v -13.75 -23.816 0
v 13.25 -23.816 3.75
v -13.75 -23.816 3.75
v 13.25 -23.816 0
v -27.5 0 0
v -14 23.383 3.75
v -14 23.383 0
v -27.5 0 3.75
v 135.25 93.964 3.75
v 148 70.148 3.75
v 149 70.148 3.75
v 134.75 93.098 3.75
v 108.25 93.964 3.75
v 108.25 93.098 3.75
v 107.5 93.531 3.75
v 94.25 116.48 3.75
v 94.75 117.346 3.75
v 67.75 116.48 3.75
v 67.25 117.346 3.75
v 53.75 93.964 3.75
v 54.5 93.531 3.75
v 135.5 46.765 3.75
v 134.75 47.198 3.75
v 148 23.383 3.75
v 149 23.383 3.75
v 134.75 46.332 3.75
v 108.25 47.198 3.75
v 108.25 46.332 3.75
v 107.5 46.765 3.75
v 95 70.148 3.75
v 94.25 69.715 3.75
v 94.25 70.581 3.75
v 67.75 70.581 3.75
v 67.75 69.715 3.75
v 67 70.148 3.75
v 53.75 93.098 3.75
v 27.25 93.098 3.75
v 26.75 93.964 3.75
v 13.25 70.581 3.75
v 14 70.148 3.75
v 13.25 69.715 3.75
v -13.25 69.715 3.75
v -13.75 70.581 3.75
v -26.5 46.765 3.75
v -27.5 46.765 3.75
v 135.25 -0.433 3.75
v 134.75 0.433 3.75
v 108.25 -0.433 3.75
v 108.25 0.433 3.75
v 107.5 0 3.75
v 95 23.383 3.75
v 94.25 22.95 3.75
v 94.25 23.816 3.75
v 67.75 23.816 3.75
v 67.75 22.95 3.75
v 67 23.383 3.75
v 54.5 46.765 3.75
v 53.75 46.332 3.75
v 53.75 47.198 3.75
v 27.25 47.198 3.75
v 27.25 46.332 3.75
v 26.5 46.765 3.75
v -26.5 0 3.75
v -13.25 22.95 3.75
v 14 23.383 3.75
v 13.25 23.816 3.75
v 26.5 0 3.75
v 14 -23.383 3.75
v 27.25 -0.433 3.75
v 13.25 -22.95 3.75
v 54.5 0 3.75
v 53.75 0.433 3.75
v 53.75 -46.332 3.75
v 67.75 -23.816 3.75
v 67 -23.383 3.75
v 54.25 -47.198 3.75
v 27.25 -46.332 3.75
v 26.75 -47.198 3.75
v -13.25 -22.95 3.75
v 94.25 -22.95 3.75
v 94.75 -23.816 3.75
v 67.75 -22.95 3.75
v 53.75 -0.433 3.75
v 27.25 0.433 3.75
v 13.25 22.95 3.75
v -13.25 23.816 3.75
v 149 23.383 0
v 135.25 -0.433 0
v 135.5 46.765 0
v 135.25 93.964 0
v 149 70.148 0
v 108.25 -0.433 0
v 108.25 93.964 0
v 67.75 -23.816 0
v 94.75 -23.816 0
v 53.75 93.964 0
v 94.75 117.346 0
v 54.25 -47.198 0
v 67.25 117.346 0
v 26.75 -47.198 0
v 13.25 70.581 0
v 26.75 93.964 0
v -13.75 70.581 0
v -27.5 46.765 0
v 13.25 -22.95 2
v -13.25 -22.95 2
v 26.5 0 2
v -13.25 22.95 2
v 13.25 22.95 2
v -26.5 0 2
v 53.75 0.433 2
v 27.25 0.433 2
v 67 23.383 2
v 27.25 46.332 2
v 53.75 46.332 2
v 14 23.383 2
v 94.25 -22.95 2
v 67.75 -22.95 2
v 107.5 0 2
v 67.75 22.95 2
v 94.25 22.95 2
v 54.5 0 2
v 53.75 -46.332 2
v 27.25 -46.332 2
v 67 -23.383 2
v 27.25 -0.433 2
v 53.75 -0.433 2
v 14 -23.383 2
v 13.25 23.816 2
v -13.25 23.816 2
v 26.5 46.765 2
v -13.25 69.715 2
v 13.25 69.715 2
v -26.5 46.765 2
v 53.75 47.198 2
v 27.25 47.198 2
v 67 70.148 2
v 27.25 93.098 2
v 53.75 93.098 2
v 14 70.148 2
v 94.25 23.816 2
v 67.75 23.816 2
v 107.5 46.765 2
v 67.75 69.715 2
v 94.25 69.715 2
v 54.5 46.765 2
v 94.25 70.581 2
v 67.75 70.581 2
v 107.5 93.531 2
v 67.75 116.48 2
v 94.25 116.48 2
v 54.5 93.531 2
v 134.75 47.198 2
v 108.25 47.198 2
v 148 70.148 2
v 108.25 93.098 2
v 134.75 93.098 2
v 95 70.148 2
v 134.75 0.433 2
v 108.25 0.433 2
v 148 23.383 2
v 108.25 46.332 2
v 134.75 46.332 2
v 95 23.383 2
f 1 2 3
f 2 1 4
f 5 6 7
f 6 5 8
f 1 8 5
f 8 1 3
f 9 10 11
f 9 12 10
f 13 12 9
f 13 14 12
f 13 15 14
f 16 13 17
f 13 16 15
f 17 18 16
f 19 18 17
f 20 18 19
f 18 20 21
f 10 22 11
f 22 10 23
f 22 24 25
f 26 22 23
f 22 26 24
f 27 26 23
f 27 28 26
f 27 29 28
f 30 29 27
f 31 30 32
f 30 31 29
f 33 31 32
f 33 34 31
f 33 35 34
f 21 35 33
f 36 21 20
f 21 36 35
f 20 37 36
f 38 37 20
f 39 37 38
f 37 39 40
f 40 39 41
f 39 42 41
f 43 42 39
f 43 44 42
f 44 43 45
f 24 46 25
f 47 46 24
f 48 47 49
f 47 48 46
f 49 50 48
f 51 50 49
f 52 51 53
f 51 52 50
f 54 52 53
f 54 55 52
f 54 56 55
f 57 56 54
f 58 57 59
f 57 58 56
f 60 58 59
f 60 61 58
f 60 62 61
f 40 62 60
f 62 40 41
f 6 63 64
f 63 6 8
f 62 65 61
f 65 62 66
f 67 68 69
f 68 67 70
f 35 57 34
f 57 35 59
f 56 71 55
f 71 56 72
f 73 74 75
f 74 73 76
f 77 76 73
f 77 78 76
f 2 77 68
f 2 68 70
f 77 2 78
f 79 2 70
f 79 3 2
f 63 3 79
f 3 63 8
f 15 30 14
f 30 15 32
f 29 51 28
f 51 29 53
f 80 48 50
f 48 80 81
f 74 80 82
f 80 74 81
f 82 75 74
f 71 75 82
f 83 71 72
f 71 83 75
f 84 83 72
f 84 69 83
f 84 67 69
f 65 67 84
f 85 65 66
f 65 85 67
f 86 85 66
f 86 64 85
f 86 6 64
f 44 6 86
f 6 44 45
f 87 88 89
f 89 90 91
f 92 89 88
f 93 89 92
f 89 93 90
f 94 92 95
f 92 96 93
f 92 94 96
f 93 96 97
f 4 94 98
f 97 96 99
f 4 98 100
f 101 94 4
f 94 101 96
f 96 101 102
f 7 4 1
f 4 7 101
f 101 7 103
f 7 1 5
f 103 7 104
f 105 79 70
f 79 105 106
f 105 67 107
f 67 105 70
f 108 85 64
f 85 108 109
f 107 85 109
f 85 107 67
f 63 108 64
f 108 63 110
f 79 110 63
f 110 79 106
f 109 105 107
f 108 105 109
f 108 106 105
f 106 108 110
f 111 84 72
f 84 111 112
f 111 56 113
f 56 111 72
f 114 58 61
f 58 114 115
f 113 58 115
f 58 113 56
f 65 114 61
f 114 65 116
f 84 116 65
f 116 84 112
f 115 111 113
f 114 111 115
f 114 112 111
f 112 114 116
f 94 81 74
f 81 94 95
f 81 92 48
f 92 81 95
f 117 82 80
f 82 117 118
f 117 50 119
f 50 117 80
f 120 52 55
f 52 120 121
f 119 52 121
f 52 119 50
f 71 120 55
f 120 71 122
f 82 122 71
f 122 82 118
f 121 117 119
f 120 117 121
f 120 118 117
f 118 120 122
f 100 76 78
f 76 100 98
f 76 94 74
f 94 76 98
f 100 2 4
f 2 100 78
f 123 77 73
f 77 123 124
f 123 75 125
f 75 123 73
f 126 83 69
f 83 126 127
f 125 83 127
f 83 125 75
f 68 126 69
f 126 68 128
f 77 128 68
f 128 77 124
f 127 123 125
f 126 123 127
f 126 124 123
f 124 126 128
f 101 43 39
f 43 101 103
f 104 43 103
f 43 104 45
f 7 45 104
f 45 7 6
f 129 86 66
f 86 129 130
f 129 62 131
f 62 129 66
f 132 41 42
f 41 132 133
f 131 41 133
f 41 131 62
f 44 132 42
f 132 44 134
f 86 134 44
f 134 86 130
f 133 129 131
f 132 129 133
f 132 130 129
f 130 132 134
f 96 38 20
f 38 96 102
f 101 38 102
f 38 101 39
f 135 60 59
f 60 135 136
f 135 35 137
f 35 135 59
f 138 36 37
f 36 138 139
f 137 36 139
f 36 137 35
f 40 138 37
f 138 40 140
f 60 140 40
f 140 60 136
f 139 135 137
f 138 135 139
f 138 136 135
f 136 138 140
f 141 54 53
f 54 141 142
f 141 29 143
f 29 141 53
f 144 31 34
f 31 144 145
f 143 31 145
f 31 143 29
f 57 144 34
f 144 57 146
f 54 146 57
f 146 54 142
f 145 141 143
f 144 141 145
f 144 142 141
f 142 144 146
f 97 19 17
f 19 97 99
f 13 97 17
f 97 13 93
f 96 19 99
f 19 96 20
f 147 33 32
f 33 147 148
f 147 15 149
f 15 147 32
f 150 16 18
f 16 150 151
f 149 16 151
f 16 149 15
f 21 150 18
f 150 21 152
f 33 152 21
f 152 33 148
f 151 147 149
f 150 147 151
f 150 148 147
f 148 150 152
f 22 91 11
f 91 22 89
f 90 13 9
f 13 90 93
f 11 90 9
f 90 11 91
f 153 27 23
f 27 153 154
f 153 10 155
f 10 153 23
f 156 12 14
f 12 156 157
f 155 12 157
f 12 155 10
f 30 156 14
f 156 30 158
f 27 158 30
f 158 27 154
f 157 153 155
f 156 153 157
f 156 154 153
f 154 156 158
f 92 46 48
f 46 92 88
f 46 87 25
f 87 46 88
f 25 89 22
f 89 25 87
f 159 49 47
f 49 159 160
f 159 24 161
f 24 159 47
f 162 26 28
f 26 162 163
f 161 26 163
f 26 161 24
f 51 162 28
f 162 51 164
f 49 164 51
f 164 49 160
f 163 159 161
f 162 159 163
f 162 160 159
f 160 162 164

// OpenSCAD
union() {
	translate(v = [0.0, 0.0, 0]) {
		difference() {
			cylinder($fn = 6, d = 55.0, h = 3.75);
			translate(v = [0, 0, 2.0]) {
				cylinder($fn = 6, d = 53.0, h = 2.75);
			}
		}
	}
	translate(v = [40.5, 23.38268590217984, 0]) {
		difference() {
			cylinder($fn = 6, d = 55.0, h = 3.75);
			translate(v = [0, 0, 2.0]) {
				cylinder($fn = 6, d = 53.0, h = 2.75);
			}
		}
	}
	translate(v = [81.0, 0.0, 0]) {
		difference() {
			cylinder($fn = 6, d = 55.0, h = 3.75);
			translate(v = [0, 0, 2.0]) {
				cylinder($fn = 6, d = 53.0, h = 2.75);
			}
		}
	}
	translate(v = [40.5, -23.38268590217984, 0]) {
		difference() {
			cylinder($fn = 6, d = 55.0, h = 3.75);
			translate(v = [0, 0, 2.0]) {
				cylinder($fn = 6, d = 53.0, h = 2.75);
			}
		}
	}
	translate(v = [0.0, 46.76537180435968, 0]) {
		difference() {
			cylinder($fn = 6, d = 55.0, h = 3.75);
			translate(v = [0, 0, 2.0]) {
				cylinder($fn = 6, d = 53.0, h = 2.75);
			}
		}
	}
	translate(v = [40.5, 70.14805770653952, 0]) {
		difference() {
			cylinder($fn = 6, d = 55.0, h = 3.75);
			translate(v = [0, 0, 2.0]) {
				cylinder($fn = 6, d = 53.0, h = 2.75);
			}
		}
	}
	translate(v = [81.0, 46.76537180435968, 0]) {
		difference() {
			cylinder($fn = 6, d = 55.0, h = 3.75);
			translate(v = [0, 0, 2.0]) {
				cylinder($fn = 6, d = 53.0, h = 2.75);
			}
		}
	}
	translate(v = [81.0, 93.53074360871936, 0]) {
		difference() {
			cylinder($fn = 6, d = 55.0, h = 3.75);
			translate(v = [0, 0, 2.0]) {
				cylinder($fn = 6, d = 53.0, h = 2.75);
			}
		}
	}
	translate(v = [121.5, 70.14805770653952, 0]) {
		difference() {
			cylinder($fn = 6, d = 55.0, h = 3.75);
			translate(v = [0, 0, 2.0]) {
				cylinder($fn = 6, d = 53.0, h = 2.75);
			}
		}
	}
	translate(v = [121.5, 23.38268590217984, 0]) {
		difference() {
			cylinder($fn = 6, d = 55.0, h = 3.75);
			translate(v = [0, 0, 2.0]) {
				cylinder($fn = 6, d = 53.0, h = 2.75);
			}
		}
	}
}
